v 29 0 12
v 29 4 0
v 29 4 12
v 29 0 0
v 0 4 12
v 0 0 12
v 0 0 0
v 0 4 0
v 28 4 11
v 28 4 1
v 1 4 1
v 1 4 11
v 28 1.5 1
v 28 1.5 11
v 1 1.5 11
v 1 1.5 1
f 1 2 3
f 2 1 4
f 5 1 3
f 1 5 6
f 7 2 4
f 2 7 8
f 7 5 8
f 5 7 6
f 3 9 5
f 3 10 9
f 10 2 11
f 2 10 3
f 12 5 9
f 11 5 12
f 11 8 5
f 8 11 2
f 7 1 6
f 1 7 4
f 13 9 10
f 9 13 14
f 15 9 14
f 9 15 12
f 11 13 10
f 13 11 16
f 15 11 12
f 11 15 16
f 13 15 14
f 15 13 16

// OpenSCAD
panel_hole_height=12;
panel_hole_width=29;
wall_thickness=4;

trrs_hole_diameter=8.5;
inner_wall_thickness=1.5;
panel_thin_part_inset=1;

difference() {
  cube([panel_hole_width, wall_thickness, panel_hole_height]);
  translate([panel_thin_part_inset, inner_wall_thickness, panel_thin_part_inset])
    inset_hole();
}

module inset_hole() {
  inset_width = panel_hole_width - 2*panel_thin_part_inset;
  inset_thickness = wall_thickness - inner_wall_thickness + 0.1;
  inset_height = panel_hole_height - 2*panel_thin_part_inset;
  cube([inset_width, inset_thickness, inset_height]);
}
